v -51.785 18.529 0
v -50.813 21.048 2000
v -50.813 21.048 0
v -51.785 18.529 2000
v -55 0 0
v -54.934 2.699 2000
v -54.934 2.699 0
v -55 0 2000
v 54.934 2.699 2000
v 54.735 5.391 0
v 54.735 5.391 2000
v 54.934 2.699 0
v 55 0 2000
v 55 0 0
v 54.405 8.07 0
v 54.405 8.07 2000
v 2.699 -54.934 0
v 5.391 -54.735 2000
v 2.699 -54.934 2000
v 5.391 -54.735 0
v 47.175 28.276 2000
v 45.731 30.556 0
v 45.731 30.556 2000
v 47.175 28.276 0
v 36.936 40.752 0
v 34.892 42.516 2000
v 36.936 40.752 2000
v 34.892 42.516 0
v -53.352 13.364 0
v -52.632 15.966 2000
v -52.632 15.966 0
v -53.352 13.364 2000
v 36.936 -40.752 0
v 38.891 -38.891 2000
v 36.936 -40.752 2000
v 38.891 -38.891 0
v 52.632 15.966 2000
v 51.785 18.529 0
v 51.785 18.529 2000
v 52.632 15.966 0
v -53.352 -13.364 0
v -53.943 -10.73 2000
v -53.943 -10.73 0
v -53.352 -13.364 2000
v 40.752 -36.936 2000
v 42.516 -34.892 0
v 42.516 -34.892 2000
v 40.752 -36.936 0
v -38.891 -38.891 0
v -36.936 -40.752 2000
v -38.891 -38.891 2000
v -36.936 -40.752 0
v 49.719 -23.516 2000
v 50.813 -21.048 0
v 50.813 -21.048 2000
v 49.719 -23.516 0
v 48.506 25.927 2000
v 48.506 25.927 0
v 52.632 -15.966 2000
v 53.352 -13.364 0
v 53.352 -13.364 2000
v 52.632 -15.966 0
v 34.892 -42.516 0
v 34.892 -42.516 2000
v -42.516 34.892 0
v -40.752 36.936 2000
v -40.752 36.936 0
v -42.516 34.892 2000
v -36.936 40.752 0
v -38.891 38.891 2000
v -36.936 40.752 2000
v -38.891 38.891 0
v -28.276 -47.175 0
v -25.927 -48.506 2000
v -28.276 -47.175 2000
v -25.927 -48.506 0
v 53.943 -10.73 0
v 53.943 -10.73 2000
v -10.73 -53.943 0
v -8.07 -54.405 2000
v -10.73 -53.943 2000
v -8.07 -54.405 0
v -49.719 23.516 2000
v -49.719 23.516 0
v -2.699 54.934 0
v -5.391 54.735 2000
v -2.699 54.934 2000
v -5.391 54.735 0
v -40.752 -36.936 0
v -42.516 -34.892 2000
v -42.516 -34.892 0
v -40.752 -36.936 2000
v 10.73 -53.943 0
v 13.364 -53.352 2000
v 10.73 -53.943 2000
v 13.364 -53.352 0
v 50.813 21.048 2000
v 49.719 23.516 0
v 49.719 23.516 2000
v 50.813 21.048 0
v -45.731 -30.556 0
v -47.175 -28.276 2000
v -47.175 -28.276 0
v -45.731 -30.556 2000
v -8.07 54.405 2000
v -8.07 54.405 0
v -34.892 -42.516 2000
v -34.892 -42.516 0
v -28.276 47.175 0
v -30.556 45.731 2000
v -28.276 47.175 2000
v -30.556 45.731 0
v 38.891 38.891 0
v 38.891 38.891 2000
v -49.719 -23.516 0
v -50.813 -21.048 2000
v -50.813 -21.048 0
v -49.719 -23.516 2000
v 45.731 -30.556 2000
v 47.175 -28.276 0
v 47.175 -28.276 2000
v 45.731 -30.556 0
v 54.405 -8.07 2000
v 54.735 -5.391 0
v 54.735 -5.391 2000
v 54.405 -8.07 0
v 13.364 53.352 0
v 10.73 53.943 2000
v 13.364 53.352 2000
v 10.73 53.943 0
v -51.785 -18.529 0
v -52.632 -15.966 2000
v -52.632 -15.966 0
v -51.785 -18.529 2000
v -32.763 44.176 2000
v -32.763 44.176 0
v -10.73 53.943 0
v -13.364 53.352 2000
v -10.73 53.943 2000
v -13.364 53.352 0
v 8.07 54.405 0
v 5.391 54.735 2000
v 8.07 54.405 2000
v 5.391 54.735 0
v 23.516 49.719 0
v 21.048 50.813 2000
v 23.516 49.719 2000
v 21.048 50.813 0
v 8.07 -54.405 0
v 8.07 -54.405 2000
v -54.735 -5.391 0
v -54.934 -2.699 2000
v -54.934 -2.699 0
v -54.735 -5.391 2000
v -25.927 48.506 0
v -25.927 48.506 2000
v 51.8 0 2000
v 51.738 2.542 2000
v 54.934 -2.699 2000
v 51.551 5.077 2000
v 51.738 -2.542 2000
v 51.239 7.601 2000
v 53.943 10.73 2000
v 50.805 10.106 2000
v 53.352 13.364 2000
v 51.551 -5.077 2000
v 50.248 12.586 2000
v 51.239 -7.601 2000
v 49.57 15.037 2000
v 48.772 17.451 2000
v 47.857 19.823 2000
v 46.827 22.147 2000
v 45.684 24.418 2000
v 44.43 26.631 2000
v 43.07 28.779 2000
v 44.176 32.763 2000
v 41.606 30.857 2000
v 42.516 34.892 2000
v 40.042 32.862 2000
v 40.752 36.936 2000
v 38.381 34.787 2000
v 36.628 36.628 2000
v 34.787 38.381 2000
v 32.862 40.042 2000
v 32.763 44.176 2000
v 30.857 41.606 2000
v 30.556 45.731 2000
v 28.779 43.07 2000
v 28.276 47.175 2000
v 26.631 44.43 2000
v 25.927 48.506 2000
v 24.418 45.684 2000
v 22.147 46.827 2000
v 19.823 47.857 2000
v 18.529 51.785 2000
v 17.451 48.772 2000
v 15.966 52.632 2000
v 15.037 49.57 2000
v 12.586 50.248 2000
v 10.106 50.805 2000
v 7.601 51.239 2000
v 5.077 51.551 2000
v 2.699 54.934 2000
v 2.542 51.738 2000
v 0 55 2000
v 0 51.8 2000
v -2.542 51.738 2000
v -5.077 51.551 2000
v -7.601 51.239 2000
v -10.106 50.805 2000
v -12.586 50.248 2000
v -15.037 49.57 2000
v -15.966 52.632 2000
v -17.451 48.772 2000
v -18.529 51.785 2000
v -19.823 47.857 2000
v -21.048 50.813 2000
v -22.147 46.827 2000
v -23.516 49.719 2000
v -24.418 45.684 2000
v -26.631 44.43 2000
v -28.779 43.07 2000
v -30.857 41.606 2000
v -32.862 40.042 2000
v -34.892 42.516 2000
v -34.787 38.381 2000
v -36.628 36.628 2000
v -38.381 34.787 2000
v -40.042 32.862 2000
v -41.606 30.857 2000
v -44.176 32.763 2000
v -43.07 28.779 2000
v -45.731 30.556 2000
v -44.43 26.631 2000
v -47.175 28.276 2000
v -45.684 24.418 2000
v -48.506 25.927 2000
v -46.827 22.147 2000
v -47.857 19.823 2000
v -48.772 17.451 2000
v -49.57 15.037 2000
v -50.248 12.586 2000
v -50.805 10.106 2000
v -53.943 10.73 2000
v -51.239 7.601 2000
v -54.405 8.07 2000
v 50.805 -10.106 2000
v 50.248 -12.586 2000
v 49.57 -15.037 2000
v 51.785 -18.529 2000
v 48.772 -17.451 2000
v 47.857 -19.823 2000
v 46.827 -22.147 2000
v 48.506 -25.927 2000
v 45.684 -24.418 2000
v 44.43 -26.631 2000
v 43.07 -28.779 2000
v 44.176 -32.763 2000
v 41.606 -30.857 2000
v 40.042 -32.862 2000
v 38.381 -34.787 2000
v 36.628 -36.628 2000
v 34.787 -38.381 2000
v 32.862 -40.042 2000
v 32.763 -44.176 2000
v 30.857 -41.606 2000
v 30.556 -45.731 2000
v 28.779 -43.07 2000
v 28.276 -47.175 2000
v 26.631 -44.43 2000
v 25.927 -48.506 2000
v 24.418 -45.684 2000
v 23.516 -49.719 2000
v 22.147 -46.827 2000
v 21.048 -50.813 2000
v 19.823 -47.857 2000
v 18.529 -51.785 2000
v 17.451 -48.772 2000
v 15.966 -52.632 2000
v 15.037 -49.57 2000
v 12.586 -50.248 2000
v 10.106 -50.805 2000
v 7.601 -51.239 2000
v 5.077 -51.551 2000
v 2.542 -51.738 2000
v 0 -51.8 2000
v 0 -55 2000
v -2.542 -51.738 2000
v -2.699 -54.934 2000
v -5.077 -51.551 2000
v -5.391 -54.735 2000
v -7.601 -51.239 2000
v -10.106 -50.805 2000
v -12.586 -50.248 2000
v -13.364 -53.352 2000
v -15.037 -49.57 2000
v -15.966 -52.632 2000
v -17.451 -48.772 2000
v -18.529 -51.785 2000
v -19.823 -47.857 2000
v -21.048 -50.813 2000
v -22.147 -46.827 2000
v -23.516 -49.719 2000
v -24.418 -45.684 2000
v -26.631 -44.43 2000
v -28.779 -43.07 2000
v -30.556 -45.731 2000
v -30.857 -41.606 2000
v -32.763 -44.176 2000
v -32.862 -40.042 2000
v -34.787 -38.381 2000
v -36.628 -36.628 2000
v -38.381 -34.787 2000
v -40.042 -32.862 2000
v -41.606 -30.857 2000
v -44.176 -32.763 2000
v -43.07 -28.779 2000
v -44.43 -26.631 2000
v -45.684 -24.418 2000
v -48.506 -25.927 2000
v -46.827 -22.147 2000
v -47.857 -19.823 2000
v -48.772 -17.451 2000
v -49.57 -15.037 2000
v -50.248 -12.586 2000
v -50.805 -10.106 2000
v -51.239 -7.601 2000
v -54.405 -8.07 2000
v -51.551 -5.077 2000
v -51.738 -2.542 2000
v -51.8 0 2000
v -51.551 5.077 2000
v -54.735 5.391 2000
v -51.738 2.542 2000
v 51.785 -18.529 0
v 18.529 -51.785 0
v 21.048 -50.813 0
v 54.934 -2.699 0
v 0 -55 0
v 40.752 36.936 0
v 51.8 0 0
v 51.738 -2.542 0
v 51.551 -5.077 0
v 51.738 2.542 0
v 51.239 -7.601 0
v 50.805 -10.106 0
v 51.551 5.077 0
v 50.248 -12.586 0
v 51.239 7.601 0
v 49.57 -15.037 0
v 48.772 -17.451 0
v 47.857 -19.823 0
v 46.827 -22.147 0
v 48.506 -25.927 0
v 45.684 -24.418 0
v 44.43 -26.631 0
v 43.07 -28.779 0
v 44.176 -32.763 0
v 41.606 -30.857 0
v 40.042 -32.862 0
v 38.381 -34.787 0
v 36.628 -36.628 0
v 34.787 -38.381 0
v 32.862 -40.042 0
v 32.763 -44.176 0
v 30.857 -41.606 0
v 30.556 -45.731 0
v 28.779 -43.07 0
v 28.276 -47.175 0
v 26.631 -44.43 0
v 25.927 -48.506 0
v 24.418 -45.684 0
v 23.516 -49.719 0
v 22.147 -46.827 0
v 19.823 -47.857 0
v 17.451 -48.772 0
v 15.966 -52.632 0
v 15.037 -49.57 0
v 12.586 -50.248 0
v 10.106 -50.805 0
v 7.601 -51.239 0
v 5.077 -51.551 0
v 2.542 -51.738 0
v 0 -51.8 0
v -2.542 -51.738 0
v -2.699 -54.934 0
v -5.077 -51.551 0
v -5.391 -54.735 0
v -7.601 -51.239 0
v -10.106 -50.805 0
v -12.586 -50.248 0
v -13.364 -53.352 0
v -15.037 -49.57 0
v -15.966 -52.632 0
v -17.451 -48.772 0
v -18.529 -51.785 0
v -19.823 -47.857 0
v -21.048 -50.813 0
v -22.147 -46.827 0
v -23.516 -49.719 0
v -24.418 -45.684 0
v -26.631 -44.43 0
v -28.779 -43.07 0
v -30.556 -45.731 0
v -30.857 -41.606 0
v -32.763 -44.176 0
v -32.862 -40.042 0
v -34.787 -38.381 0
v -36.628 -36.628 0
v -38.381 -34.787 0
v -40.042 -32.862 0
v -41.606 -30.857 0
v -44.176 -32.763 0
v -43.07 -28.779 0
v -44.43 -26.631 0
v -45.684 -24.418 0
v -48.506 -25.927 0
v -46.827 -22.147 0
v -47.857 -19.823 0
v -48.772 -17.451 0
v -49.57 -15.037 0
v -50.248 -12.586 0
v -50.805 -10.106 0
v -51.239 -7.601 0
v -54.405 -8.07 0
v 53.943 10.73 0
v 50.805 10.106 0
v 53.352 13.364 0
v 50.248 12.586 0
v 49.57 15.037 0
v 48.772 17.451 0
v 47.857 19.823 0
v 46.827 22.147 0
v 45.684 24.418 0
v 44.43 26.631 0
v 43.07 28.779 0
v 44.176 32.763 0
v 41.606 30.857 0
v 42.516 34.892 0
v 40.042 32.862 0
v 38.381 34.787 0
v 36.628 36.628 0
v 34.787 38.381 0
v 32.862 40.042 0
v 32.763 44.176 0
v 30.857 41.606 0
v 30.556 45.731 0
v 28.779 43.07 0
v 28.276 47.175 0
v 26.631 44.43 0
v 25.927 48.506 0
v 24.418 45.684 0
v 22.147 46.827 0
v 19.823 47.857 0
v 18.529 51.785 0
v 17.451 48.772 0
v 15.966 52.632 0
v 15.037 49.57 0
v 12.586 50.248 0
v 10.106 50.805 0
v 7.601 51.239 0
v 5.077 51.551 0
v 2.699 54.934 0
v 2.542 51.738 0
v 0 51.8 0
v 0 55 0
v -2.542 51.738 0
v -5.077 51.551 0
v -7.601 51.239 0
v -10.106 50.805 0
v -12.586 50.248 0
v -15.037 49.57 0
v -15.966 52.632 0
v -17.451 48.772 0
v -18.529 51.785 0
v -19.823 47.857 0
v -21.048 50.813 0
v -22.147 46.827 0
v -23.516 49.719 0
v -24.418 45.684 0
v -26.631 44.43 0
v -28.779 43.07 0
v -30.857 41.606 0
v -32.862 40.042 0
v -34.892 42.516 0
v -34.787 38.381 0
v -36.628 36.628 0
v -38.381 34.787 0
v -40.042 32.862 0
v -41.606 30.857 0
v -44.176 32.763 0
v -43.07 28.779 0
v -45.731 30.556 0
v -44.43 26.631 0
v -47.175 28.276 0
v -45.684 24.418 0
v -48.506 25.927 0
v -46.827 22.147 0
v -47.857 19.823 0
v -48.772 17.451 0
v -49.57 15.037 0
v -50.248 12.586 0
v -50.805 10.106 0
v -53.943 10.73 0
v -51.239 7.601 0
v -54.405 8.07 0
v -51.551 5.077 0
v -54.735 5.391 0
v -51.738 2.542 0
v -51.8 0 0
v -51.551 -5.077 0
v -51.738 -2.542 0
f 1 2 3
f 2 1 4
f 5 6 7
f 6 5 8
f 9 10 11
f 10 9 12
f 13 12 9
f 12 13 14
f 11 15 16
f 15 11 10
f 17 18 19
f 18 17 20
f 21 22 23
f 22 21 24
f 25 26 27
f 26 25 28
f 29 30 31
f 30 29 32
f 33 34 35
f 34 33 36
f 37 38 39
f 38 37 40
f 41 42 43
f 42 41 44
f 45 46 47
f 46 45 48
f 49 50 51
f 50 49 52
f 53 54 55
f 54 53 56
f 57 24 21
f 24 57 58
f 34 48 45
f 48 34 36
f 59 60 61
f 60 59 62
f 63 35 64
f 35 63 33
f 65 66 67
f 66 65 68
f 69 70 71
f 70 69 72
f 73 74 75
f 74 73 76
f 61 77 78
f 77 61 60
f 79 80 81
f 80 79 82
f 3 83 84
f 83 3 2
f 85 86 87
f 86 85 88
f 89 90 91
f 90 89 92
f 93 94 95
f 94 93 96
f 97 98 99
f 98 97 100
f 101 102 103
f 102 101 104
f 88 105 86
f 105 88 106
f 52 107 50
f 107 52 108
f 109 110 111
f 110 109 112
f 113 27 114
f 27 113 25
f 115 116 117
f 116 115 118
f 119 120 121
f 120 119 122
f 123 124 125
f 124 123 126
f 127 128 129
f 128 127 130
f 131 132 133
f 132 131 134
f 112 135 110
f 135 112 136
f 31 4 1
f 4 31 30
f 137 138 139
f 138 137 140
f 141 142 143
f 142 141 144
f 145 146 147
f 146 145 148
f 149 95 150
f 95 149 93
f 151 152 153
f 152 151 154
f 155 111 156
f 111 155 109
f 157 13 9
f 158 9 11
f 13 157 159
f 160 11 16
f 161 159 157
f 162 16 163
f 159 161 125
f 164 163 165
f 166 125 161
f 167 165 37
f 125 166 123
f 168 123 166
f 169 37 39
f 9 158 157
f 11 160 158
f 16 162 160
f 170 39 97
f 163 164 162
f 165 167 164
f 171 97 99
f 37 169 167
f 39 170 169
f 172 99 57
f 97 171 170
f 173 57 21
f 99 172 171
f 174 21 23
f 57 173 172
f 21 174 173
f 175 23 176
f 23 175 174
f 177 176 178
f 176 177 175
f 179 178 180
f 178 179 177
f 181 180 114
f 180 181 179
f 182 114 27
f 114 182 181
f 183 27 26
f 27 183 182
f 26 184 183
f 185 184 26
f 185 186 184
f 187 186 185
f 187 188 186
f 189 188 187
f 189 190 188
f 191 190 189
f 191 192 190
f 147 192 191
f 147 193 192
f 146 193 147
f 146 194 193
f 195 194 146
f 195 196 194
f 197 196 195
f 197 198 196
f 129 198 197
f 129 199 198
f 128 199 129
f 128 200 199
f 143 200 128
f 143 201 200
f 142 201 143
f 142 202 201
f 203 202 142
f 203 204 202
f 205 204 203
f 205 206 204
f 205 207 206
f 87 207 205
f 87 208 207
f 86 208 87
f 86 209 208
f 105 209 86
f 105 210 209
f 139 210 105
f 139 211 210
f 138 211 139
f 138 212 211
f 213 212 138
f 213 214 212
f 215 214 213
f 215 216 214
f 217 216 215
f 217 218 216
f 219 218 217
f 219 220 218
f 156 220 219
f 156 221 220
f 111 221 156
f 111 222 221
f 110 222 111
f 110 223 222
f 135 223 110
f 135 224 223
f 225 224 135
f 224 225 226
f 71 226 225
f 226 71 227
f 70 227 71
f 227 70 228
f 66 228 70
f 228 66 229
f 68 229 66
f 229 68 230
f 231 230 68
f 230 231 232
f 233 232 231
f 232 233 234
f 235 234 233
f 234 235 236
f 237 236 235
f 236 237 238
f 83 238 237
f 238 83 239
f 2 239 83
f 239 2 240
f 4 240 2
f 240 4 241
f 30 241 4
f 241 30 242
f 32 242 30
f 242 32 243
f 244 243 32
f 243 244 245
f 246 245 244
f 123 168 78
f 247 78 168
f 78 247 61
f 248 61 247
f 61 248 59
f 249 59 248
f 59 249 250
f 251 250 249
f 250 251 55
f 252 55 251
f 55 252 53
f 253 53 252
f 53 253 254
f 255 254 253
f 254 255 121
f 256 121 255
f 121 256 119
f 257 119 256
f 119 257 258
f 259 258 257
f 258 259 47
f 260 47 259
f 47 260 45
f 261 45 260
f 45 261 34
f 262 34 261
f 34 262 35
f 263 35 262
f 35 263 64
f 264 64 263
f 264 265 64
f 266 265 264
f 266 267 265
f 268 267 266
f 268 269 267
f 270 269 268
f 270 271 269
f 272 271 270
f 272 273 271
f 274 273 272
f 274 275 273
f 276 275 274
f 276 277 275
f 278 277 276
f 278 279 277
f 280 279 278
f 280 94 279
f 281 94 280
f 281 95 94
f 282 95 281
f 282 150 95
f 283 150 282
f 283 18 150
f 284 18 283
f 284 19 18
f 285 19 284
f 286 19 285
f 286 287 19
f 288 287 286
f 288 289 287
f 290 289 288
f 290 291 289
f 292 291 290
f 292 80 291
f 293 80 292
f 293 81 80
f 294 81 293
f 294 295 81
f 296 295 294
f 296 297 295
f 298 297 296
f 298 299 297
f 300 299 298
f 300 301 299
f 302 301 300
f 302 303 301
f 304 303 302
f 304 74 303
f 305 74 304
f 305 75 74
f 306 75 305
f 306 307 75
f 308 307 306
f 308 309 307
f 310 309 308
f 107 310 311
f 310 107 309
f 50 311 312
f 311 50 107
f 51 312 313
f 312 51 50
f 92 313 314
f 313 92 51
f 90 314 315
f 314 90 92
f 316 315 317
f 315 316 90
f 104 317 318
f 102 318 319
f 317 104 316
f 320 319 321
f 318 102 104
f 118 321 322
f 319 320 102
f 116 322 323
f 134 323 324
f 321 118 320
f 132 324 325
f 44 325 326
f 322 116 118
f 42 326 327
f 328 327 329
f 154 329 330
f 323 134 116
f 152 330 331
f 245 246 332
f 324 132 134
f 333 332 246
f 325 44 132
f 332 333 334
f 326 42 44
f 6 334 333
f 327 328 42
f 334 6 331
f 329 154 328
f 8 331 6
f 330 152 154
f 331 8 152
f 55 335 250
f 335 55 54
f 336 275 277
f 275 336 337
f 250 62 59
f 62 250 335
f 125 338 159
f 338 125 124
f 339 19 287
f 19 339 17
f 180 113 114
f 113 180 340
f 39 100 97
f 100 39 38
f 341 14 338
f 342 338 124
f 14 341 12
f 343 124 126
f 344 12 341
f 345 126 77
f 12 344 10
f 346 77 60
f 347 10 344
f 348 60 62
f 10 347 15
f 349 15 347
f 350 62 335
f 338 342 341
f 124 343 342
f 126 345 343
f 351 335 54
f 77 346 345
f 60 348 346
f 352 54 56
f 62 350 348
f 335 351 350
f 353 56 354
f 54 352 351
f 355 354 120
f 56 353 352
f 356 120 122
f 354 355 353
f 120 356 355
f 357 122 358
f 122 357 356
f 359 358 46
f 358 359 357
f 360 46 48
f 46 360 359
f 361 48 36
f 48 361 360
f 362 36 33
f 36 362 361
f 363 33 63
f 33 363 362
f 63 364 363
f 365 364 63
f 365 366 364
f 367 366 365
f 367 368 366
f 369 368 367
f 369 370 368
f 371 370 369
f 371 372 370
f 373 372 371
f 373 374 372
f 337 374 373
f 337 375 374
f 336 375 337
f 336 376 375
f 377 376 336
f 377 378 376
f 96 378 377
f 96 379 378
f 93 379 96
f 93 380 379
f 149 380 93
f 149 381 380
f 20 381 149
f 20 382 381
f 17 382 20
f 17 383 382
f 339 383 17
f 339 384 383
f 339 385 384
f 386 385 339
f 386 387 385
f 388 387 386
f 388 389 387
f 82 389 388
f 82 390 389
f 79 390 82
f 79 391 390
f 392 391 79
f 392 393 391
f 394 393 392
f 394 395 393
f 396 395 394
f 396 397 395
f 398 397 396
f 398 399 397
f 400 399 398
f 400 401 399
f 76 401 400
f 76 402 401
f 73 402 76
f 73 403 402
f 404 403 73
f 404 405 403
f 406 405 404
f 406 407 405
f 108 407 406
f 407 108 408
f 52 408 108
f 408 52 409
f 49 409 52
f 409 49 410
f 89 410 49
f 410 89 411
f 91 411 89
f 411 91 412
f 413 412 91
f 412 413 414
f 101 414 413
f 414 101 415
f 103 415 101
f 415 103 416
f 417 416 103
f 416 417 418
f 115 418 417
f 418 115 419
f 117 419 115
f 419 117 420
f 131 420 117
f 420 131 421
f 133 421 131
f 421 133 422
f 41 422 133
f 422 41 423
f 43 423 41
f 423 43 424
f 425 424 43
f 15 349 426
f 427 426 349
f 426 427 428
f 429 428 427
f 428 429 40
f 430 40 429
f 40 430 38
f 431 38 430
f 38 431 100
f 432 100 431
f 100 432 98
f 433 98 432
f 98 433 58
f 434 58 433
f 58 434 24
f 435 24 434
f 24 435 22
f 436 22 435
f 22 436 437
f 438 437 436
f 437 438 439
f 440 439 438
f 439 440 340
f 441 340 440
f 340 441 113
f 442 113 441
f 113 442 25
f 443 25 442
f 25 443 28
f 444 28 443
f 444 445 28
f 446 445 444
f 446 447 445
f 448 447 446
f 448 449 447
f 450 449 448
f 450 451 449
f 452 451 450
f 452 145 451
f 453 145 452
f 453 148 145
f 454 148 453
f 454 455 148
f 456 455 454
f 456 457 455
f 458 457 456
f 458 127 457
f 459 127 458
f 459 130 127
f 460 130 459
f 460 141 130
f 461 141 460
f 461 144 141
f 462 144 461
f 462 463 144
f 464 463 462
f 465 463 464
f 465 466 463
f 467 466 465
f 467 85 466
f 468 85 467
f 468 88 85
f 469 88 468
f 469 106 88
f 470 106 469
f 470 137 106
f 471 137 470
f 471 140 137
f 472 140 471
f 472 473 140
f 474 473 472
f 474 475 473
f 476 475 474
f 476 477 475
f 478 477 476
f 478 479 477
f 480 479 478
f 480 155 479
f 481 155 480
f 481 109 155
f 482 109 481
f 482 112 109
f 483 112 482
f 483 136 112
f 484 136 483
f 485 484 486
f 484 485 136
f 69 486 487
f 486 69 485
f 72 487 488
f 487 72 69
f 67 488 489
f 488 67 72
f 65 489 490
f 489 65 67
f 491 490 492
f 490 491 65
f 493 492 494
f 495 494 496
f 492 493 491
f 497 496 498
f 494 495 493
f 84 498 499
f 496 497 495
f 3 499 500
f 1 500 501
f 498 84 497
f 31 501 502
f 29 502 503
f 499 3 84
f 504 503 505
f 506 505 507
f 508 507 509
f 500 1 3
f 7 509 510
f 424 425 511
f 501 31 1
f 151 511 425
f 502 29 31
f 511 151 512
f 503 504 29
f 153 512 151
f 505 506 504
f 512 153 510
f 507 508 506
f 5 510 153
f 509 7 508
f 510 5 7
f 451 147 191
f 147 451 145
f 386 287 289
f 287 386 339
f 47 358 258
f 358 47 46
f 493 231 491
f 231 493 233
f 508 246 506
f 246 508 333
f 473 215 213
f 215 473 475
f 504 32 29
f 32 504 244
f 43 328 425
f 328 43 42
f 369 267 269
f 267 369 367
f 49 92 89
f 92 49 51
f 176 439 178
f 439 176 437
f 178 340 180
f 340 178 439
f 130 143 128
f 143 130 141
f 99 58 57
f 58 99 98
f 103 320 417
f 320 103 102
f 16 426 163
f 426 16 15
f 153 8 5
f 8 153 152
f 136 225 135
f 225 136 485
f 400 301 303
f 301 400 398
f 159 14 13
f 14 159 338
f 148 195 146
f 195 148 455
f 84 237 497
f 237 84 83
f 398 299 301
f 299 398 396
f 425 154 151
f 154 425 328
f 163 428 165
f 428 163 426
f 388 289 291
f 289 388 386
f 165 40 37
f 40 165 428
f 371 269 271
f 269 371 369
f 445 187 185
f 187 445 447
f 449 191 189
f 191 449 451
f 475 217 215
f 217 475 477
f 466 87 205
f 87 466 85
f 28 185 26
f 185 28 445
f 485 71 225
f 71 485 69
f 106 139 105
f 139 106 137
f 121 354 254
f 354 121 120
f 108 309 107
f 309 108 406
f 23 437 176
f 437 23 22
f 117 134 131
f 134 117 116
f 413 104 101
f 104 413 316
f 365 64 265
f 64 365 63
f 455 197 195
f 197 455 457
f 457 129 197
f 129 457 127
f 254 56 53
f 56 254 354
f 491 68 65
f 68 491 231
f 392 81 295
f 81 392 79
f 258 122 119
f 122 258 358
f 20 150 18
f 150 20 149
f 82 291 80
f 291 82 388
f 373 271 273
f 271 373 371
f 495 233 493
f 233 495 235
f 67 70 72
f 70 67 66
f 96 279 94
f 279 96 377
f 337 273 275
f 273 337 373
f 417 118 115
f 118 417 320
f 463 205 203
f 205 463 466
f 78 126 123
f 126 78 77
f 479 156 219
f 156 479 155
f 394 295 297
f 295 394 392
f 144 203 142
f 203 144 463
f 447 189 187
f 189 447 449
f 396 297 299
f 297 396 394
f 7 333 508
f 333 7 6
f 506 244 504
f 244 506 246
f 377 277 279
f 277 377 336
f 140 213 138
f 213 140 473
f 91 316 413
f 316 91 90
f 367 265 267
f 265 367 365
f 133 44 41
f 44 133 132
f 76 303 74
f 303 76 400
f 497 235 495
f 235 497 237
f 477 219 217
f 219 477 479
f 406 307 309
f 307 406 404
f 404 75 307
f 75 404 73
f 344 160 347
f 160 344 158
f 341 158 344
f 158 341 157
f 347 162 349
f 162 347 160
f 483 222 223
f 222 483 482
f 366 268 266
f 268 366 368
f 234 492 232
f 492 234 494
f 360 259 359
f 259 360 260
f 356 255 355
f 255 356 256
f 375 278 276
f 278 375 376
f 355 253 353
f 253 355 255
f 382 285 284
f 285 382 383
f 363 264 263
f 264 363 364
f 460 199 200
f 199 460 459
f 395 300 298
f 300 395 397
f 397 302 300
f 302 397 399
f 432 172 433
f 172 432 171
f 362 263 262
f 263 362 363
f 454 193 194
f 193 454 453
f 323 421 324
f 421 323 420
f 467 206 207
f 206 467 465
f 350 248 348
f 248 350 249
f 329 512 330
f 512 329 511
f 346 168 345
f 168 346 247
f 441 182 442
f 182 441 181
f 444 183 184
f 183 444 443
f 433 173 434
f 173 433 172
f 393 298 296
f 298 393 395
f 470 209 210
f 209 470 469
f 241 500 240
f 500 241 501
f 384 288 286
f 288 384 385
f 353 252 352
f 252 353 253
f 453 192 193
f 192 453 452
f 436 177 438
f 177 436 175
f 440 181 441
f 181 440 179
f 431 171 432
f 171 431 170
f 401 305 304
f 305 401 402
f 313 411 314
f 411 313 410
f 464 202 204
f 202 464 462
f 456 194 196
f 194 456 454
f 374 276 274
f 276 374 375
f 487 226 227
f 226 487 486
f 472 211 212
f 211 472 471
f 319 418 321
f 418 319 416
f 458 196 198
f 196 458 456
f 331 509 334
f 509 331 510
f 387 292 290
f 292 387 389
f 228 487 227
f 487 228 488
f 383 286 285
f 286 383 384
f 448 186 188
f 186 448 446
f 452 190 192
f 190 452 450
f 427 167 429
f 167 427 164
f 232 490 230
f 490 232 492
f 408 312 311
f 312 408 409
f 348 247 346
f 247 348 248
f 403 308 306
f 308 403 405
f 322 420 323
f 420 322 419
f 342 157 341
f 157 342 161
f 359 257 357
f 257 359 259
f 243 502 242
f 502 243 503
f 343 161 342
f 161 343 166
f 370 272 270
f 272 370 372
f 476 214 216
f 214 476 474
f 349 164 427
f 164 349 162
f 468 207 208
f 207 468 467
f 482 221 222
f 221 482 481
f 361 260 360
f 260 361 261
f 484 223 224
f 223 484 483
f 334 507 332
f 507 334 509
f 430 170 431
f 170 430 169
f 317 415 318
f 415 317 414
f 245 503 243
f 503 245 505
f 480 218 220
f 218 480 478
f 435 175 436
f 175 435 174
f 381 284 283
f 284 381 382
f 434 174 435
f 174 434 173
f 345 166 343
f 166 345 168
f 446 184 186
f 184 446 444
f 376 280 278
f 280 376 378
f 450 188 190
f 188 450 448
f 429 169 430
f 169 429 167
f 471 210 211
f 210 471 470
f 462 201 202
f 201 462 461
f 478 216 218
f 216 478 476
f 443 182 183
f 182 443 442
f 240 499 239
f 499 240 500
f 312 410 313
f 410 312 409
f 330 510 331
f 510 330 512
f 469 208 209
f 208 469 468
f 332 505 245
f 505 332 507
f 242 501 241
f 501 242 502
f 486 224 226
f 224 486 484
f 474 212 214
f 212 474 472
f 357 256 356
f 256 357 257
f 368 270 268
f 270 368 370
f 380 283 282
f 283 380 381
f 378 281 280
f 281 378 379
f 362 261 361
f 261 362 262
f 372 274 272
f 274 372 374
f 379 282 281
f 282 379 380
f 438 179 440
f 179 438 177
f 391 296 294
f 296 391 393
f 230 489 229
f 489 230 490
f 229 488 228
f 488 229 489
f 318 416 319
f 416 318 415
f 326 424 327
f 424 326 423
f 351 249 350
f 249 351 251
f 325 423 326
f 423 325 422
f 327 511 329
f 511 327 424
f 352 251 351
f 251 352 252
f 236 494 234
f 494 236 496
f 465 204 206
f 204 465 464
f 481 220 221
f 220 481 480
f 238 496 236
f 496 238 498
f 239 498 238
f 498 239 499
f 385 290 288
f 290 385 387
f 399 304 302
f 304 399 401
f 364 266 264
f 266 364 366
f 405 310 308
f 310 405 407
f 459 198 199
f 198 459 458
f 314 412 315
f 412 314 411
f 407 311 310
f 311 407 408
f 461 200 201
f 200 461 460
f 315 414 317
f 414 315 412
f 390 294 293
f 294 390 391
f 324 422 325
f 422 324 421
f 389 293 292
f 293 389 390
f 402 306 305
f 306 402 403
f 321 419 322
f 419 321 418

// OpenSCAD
$fn = 128;

// HT pipe parameters (approximate for HT 110)
outer_d = 110;        // mm
wall_thickness = 3.2; // mm (typical for HT 110; adjust if needed)
length = 2000;        // mm

inner_d = outer_d - 2 * wall_thickness;

difference() {
    cylinder(h = length, d = outer_d, center = false);
    translate([0, 0, -0.5])
        cylinder(h = length + 1, d = inner_d, center = false);
}
